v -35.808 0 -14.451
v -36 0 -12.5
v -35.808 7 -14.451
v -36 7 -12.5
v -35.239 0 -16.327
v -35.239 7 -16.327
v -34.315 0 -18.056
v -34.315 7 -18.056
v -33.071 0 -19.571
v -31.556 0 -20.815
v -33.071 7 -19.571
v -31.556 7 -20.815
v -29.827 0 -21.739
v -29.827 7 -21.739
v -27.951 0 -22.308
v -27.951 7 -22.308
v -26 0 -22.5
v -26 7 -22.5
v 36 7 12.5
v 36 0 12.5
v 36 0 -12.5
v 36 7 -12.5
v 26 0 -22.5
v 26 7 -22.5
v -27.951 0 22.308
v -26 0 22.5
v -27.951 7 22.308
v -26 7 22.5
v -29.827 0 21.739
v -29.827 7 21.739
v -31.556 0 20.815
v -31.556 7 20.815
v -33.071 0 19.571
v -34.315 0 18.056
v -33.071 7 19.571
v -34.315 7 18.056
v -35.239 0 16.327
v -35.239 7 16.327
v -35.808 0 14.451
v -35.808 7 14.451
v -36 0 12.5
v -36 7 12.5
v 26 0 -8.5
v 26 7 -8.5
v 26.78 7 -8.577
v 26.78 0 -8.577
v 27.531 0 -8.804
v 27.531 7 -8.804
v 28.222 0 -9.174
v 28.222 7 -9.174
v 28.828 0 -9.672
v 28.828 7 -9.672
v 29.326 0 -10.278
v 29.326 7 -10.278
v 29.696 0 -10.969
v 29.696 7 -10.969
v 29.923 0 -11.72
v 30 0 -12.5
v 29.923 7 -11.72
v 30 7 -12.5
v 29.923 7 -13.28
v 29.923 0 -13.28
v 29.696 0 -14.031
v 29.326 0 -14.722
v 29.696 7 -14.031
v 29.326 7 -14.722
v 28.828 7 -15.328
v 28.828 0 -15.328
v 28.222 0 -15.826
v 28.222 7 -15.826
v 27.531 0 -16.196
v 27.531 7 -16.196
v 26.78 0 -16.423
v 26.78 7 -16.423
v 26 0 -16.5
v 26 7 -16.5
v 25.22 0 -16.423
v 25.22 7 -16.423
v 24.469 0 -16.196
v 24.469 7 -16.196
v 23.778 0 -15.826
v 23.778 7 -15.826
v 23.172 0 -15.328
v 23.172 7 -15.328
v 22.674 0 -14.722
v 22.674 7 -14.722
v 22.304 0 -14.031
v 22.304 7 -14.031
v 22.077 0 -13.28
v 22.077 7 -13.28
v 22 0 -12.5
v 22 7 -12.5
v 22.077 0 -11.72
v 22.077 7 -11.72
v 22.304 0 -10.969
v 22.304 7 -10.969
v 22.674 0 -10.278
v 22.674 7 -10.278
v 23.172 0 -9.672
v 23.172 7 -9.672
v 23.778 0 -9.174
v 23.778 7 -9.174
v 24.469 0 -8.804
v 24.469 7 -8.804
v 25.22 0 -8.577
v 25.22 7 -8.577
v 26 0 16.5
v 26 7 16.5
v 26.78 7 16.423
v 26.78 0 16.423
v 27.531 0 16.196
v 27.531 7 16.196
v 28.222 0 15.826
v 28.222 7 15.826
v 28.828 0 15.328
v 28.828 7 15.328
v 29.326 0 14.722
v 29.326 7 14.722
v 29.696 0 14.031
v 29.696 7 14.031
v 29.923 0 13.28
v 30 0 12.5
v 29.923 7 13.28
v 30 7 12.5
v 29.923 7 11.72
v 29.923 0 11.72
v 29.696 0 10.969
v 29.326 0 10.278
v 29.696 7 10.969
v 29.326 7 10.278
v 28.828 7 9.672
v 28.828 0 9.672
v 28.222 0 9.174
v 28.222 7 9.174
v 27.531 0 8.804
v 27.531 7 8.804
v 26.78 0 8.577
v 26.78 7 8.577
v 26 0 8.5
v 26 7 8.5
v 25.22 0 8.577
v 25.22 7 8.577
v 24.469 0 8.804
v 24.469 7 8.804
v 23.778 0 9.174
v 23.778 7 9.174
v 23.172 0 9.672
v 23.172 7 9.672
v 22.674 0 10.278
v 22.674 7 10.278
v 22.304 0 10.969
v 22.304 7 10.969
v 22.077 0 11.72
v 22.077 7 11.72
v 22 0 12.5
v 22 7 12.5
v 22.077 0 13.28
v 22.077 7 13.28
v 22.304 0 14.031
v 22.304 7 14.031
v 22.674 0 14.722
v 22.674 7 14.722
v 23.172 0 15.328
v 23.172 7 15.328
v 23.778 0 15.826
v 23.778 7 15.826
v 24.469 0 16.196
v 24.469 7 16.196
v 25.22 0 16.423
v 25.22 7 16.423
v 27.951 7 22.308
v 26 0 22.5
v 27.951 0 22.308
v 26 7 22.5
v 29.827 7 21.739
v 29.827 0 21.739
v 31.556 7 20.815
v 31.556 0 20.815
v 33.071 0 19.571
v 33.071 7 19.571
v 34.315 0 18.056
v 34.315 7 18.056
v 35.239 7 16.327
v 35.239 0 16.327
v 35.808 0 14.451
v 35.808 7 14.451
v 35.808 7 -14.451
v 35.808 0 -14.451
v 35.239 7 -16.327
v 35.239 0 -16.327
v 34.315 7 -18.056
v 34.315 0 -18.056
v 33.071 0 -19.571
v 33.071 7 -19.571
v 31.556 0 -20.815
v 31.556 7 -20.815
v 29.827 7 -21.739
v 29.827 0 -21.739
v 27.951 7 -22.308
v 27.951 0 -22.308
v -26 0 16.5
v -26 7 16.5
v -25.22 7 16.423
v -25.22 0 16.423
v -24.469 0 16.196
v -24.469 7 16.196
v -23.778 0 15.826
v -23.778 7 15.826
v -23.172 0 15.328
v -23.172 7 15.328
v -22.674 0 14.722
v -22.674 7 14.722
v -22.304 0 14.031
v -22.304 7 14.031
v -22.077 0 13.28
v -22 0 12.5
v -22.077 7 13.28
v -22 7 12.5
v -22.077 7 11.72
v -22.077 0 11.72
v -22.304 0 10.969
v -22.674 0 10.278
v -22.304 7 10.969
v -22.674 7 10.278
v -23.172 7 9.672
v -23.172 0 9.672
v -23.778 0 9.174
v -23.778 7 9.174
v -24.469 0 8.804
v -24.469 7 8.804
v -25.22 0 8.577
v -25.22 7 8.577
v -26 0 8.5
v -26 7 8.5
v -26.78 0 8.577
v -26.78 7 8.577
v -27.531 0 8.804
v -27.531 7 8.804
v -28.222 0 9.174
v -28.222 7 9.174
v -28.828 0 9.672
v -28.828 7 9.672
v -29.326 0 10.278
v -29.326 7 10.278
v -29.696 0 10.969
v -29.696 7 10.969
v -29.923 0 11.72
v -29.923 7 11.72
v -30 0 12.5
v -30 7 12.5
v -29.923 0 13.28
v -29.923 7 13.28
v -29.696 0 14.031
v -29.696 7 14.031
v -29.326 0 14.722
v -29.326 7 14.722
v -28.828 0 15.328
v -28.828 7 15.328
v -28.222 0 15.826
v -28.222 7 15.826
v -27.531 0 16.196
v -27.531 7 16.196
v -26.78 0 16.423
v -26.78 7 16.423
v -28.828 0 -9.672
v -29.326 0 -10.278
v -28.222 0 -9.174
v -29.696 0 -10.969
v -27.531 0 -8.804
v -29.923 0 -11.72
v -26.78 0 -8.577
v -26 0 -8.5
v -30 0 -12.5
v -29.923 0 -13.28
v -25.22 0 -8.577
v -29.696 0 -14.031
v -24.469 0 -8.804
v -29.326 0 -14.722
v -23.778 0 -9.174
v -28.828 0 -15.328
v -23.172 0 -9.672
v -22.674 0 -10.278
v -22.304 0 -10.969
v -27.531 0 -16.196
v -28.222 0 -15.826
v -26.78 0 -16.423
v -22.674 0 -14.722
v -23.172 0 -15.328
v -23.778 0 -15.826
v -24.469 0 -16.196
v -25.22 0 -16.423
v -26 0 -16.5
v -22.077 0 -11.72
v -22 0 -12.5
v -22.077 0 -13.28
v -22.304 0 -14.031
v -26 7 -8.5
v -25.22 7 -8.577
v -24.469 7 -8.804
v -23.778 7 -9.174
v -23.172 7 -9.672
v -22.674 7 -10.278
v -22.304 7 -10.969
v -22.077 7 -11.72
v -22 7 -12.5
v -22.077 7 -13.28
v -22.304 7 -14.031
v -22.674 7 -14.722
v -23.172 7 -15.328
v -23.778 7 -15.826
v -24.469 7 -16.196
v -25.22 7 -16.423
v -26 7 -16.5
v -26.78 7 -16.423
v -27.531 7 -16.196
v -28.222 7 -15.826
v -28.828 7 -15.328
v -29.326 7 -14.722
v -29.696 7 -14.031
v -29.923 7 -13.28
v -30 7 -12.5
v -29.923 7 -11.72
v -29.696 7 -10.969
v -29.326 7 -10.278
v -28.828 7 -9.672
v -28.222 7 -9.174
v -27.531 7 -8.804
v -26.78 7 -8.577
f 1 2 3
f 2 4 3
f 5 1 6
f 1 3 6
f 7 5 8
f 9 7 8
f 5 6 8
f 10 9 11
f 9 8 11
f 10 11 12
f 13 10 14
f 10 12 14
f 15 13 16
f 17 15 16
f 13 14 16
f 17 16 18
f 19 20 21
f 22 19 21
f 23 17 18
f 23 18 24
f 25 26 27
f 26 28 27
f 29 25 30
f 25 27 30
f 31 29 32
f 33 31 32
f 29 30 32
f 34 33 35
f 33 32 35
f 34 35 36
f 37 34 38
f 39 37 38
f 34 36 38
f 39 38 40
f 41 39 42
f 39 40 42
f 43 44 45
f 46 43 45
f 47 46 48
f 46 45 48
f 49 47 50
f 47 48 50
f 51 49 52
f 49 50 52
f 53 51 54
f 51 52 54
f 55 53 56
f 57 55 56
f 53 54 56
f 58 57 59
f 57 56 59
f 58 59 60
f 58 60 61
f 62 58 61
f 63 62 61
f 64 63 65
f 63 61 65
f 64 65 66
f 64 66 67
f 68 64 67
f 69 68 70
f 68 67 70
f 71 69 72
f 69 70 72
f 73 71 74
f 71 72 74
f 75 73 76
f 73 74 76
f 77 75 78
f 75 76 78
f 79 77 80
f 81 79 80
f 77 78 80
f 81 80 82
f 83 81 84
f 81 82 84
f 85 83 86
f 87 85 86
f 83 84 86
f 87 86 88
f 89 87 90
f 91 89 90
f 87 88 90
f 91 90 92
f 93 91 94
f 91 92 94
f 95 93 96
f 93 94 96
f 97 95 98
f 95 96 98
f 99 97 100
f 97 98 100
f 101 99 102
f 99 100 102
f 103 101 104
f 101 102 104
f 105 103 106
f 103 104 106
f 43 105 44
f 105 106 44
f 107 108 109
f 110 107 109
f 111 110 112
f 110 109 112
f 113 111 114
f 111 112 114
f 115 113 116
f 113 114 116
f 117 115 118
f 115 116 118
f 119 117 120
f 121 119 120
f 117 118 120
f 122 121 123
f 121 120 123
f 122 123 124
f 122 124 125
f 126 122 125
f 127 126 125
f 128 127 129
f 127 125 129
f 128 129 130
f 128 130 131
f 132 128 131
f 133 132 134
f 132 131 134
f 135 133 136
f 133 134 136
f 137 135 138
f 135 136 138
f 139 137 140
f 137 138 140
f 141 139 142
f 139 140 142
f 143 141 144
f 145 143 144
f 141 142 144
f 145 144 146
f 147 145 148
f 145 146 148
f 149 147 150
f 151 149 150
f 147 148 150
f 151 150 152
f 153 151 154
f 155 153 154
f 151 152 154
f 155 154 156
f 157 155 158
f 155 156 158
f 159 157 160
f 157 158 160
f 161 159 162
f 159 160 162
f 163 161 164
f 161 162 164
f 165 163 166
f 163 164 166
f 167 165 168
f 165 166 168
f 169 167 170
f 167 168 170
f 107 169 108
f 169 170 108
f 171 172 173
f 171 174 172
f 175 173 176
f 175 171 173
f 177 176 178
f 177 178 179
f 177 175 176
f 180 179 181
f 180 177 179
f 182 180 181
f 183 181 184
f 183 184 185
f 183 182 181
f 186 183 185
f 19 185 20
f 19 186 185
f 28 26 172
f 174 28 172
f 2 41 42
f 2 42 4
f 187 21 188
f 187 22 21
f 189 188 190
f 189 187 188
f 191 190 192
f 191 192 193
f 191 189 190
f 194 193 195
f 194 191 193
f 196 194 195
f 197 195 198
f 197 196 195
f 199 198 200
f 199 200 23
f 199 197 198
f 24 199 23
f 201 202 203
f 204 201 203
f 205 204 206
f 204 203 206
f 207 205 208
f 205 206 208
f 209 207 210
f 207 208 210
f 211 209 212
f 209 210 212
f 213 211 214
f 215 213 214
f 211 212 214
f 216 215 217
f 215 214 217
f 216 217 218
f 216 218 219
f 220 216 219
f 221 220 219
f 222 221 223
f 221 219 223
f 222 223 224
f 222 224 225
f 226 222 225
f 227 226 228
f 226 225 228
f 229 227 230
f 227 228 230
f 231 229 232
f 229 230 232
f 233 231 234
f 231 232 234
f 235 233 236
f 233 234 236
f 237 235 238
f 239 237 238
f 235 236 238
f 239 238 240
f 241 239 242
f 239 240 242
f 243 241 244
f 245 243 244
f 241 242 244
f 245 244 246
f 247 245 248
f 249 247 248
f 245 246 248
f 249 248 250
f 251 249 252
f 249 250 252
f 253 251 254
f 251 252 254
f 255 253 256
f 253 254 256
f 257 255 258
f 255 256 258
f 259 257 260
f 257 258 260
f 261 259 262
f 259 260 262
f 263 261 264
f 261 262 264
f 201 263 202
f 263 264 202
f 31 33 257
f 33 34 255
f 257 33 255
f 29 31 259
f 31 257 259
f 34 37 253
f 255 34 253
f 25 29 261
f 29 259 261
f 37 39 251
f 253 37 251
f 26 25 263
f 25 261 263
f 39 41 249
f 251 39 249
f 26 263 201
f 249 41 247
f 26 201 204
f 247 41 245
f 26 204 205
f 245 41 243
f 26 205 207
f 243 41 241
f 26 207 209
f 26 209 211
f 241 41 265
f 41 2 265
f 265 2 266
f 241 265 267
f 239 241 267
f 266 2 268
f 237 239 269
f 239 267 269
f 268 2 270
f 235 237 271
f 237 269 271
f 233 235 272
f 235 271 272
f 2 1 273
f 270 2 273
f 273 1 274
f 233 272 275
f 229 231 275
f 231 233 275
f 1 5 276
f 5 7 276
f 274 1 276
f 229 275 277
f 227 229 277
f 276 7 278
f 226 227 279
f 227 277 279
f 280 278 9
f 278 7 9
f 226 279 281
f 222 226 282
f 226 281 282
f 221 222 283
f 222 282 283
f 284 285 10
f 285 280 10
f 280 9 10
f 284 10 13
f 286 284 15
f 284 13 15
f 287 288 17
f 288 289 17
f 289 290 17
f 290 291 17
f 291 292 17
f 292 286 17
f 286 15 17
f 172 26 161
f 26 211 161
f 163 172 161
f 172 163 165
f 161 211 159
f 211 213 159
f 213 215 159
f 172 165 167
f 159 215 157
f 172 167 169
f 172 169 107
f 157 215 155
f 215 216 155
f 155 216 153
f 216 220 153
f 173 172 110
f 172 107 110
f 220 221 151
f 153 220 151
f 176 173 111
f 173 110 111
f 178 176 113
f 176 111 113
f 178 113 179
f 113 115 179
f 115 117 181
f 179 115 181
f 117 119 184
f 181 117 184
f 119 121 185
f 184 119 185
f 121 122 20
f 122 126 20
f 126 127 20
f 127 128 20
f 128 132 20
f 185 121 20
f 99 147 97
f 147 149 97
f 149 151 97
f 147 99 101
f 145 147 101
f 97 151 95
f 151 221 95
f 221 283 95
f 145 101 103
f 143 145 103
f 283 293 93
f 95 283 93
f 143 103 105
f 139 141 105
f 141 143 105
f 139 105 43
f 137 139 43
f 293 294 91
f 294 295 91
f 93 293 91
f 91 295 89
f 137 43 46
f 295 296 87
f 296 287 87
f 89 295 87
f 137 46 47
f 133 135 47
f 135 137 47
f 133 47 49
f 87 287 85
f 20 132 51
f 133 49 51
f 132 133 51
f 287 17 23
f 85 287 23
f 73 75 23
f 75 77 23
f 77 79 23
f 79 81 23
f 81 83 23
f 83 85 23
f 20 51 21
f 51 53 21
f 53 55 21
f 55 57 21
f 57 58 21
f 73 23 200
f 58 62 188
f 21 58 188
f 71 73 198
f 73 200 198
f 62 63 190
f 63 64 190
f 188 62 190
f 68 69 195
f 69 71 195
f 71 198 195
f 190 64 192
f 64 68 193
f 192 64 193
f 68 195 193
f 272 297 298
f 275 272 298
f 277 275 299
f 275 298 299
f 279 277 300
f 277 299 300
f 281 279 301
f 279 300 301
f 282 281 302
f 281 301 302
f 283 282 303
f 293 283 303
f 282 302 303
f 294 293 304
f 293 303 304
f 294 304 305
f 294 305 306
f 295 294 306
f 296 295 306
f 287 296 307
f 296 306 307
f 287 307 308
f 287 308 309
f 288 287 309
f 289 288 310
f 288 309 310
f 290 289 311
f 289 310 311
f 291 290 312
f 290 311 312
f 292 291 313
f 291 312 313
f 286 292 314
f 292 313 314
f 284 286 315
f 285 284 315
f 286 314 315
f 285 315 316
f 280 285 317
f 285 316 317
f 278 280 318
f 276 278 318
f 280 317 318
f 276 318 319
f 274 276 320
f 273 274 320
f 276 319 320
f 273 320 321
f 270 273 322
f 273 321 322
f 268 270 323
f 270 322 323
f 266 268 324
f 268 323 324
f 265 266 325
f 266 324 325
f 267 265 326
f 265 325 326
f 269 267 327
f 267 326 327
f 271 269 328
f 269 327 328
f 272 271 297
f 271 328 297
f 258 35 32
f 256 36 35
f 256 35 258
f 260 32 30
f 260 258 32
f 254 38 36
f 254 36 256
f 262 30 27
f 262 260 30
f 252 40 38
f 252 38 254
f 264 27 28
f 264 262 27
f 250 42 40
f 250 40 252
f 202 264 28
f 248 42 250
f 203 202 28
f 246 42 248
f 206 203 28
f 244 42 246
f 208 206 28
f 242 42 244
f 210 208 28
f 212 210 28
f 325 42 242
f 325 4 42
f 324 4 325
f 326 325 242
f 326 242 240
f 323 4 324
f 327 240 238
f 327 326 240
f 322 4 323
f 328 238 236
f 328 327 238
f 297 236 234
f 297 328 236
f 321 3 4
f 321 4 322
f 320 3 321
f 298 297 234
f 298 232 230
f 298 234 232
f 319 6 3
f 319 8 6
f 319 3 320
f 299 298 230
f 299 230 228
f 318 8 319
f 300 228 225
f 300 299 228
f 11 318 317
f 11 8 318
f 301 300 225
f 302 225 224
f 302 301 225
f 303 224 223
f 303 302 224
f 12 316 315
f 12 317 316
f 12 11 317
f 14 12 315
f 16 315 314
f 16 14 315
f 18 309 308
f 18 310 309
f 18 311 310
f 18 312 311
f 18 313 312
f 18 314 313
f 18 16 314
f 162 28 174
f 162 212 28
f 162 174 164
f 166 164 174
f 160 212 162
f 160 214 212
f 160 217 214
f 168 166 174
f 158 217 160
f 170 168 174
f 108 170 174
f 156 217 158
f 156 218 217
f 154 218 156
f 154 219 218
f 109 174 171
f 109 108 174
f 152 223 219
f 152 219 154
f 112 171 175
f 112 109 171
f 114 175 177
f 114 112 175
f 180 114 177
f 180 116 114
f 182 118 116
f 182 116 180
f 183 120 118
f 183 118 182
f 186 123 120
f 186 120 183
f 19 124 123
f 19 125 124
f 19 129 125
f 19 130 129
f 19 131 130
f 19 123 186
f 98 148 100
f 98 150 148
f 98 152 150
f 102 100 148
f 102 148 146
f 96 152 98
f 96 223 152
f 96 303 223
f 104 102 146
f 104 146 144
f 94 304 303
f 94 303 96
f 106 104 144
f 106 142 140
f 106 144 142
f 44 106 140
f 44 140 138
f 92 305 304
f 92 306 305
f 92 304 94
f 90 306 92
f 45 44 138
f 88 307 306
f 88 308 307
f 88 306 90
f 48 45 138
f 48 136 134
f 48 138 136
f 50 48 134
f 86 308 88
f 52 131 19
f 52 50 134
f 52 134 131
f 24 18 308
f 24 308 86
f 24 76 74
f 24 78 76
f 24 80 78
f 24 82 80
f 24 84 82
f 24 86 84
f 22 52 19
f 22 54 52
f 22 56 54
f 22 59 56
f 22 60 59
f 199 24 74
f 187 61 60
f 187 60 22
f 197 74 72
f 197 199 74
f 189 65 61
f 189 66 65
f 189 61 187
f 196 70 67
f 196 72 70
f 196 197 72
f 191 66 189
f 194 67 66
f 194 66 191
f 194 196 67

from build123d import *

# Parameters (mm, degrees)
CROQUIS1_W              = 72
CROQUIS1_H              = 45
SALIENTE_EXTRUIR1_DEPTH = 7
REDONDEO1_R             = 10
REDONDEO2_R             = 10
CROQUIS2_R              = 4
CORTAR_EXTRUIR1_DEPTH   = 7


with BuildPart() as part:
    # Croquis1 → Saliente-Extruir1 (new body)
    with BuildSketch(Plane(origin=(0, 0, 0), x_dir=(1, 0, 0), z_dir=(0, 1, 0))):
        Rectangle(CROQUIS1_W, CROQUIS1_H)
    extrude(amount=SALIENTE_EXTRUIR1_DEPTH)

    # Redondeo1
    redondeo1_edges = [part.edges().sort_by_distance(p)[0] for p in [
        (36, 3.5, 22.5),
    ]]
    fillet(redondeo1_edges, radius=REDONDEO1_R)

    # Redondeo2
    redondeo2_edges = [part.edges().sort_by_distance(p)[0] for p in [
        (-36, 3.5, 22.5),
        (-36, 3.5, -22.5),
        (36, 3.5, -22.5),
    ]]
    fillet(redondeo2_edges, radius=REDONDEO2_R)

    # Croquis2 → Cortar-Extruir1 (cut)
    with BuildSketch(Plane(origin=(0, 7, 0), x_dir=(1, 0, 0), z_dir=(0, 1, 0))):
        with Locations(Location((-26, 12.5, 0), (0, 0, 270))):
            Circle(CROQUIS2_R)
        with Locations(Location((-26, -12.5, 0), (0, 0, 270))):
            Circle(CROQUIS2_R)
        with Locations(Location((26, -12.5, 0), (0, 0, 270))):
            Circle(CROQUIS2_R)
        with Locations(Location((26, 12.5, 0), (0, 0, 270))):
            Circle(CROQUIS2_R)
    extrude(amount=-CORTAR_EXTRUIR1_DEPTH, mode=Mode.SUBTRACT)


solid = part.part
